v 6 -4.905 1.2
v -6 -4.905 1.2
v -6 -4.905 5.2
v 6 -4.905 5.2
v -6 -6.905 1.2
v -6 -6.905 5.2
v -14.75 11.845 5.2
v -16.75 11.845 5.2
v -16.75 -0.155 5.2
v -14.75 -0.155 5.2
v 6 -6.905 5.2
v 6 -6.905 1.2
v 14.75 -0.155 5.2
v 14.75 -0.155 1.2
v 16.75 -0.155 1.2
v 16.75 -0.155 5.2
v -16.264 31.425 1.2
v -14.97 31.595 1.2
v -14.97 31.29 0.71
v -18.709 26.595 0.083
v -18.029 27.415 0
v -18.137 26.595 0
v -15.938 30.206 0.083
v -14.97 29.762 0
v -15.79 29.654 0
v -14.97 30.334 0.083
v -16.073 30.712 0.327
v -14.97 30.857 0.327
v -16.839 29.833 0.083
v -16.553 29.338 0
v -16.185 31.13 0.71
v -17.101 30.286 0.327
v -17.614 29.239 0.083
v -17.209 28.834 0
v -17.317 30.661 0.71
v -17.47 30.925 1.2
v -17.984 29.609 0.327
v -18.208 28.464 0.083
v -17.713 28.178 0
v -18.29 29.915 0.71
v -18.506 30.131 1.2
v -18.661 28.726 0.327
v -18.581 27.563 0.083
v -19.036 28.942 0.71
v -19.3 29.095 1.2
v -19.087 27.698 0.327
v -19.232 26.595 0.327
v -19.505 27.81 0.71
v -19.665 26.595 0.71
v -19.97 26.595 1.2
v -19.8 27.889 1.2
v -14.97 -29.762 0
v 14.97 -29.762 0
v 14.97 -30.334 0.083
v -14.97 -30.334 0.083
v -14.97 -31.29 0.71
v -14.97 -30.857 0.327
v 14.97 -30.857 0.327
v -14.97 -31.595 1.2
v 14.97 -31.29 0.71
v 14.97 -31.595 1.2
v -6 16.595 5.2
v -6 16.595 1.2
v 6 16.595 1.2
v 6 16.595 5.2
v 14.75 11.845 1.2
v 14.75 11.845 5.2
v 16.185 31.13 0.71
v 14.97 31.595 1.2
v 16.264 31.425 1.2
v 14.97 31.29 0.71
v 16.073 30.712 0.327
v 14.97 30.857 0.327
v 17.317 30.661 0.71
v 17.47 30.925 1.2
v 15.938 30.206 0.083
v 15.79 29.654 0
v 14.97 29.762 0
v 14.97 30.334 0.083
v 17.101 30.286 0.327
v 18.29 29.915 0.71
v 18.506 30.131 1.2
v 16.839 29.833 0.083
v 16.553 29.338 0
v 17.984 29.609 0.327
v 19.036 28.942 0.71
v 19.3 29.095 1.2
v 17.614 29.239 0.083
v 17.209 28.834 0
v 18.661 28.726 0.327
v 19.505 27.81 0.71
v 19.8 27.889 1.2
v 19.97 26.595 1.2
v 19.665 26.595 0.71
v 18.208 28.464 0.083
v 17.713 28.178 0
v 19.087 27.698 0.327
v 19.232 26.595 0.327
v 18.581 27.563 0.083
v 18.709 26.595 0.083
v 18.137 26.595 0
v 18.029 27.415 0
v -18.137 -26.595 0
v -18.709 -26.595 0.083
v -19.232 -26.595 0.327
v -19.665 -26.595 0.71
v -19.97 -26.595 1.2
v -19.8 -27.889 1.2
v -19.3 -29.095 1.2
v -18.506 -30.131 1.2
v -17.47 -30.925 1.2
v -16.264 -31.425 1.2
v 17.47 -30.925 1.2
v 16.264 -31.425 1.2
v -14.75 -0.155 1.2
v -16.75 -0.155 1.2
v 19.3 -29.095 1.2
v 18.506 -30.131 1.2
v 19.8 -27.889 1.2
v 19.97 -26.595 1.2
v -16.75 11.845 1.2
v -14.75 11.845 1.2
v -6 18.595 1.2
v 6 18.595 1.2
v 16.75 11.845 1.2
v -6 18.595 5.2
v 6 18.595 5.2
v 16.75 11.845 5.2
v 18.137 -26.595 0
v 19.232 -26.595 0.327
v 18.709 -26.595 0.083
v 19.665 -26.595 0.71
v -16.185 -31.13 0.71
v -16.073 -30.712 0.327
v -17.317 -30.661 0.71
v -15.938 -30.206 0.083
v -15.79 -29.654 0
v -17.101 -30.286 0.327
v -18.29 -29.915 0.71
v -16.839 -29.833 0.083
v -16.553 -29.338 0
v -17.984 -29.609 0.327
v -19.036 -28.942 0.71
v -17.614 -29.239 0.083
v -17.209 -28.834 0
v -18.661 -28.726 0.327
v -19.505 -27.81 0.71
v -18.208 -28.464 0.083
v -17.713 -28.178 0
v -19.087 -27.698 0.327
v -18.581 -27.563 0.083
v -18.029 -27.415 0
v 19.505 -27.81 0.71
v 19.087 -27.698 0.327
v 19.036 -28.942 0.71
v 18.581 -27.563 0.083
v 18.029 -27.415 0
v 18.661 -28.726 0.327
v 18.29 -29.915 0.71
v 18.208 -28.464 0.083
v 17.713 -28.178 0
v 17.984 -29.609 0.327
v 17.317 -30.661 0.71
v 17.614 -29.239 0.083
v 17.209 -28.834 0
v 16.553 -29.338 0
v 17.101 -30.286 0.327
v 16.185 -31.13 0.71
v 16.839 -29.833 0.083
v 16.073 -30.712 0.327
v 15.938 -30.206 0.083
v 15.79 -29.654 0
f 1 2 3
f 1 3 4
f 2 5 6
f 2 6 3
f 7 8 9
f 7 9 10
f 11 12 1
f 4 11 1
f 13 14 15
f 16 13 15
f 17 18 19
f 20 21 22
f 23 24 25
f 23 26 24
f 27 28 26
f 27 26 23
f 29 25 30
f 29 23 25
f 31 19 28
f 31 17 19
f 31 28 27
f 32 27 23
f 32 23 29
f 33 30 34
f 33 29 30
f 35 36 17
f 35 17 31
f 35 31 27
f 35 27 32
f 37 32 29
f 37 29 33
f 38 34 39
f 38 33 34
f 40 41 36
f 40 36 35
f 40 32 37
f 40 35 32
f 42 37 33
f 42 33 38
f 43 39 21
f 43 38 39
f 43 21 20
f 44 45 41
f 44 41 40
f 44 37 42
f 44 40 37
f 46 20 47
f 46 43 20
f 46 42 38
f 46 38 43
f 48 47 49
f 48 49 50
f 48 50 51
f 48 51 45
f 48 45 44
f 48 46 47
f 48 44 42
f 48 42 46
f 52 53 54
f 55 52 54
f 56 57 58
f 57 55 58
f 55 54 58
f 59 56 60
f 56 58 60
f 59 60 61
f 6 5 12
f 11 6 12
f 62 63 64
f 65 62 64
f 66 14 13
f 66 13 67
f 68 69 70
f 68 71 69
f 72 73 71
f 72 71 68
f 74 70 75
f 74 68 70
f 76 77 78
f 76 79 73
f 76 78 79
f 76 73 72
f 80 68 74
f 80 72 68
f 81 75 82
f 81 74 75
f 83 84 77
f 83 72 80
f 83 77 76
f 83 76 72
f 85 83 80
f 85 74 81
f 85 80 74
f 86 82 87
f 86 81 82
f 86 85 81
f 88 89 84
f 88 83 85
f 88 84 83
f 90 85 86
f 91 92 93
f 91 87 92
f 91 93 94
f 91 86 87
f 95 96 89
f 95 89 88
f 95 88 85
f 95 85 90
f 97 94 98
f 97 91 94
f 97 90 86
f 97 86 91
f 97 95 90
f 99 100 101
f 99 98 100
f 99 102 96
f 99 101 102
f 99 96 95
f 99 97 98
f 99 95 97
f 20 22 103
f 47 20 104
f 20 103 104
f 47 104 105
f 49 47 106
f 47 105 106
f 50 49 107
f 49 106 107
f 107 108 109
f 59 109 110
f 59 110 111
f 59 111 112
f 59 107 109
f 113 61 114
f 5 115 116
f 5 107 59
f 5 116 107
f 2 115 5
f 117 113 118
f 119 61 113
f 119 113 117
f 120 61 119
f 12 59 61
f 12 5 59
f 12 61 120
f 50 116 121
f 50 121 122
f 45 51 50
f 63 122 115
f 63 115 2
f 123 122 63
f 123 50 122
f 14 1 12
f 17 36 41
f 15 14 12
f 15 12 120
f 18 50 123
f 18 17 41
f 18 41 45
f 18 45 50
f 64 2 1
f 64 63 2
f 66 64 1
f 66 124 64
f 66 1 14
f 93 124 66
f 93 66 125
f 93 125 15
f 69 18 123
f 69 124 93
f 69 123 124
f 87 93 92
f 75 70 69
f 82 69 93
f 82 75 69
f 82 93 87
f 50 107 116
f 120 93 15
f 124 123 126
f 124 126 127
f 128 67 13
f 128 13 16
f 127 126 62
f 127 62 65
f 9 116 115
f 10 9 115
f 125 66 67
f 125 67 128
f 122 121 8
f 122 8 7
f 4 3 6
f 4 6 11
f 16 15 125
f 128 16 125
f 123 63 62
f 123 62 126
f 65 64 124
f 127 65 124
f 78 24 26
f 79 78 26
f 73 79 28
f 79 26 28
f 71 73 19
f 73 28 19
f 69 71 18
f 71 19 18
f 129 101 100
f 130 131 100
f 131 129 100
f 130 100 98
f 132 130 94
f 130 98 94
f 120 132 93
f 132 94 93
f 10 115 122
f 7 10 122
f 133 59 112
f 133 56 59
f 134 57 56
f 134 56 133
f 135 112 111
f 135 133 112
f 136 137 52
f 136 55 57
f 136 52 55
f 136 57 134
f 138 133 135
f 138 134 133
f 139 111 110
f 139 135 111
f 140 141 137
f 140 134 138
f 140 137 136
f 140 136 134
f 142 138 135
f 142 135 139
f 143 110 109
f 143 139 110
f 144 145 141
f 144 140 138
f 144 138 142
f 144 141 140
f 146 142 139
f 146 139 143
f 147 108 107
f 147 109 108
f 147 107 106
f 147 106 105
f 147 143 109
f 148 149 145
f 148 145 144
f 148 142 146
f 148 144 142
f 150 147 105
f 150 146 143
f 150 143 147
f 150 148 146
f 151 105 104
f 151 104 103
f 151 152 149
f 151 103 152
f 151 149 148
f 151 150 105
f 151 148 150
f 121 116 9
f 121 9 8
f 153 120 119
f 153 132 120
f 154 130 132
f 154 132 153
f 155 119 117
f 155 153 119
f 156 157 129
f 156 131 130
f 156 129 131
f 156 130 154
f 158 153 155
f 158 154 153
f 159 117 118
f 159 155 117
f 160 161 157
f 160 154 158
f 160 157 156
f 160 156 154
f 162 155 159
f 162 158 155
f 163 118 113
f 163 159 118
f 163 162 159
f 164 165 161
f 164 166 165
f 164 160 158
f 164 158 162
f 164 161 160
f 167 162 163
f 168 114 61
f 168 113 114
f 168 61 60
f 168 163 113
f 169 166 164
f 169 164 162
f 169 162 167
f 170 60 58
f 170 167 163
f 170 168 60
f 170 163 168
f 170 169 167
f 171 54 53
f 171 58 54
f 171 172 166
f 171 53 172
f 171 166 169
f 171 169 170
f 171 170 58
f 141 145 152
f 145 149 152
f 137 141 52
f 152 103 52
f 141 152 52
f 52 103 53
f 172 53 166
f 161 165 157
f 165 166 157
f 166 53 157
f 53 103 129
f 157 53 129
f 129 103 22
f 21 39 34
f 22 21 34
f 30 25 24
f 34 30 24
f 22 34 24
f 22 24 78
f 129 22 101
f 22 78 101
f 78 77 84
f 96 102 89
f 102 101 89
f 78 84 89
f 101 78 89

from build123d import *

# Parameters (mm, degrees)
SKETCH_1_W      = 39.94
SKETCH_1_H      = 63.19
EXTRUDE_1_DEPTH = 1.2
FILLET_1_R      = 5
FILLET_3_R      = 2
SKETCH_5_W      = 2
SKETCH_5_H      = 12
SKETCH_5_W_2    = 12
SKETCH_5_H_2    = 2
EXTRUDE_4_DEPTH = 4


with BuildPart() as part:
    # 草图1 → 凸台-拉伸1 (new body)
    with BuildSketch(Plane.XY):
        Rectangle(SKETCH_1_W, SKETCH_1_H)
    extrude(amount=EXTRUDE_1_DEPTH)

    # 圆角1
    fillet_1_edges = [part.edges().sort_by_distance(p)[0] for p in [
        (19.97, -31.595, 0.6),
        (-19.97, -31.595, 0.6),
        (-19.97, 31.595, 0.6),
        (19.97, 31.595, 0.6),
    ]]
    fillet(fillet_1_edges, radius=FILLET_1_R)

    # 圆角3
    # the kernel refuses this fillet: 2 mm, written as the material it takes off along each edge
    with BuildSketch(Plane(origin=(-14.97, -26.595, 0), x_dir=(0, -1, 0), z_dir=(1, 0, 0))) as fillet_3_piece_1:
        with BuildLine():
            CenterArc((3.166969722, -2), FILLET_3_R, 23.578178478, 66.421821522)
            Line((5, -1.2), (5.036660606, -1.184))
            ThreePointArc((5.036660606, -1.184), (5.04, -0.6), (5.04, 0))
            Line((5.04, 0), (5, 0.04))
            Line((5, 0.04), (3.166969722, 0.04))
            Line((3.166969722, 0.04), (3.166969722, 0))
        make_face()
    revolve(axis=Axis((-14.97, -26.595, 0), (0, 0, -1)), revolution_arc=90, mode=Mode.SUBTRACT)
    with BuildSketch(Plane(origin=(14.97, -31.595, 0), x_dir=(0, 1, 0), z_dir=(-1, 0, 0))) as fillet_3_piece_2:
        with BuildLine():
            CenterArc((1.833030278, -2), FILLET_3_R, 90, 66.421821522)
            Line((0, -1.2), (-0.036660606, -1.184))
            ThreePointArc((-0.036660606, -1.184), (-0.04, -0.6), (-0.04, 0))
            Line((-0.04, 0), (0, 0.04))
            Line((0, 0.04), (1.833030278, 0.04))
            Line((1.833030278, 0.04), (1.833030278, 0))
        make_face()
    extrude(amount=29.94, mode=Mode.SUBTRACT)
    with BuildSketch(Plane(origin=(14.97, -26.595, 0), x_dir=(1, 0, 0), z_dir=(0, 1, 0))) as fillet_3_piece_3:
        with BuildLine():
            CenterArc((3.166969722, -2), FILLET_3_R, 23.578178478, 66.421821522)
            Line((5, -1.2), (5.036660606, -1.184))
            ThreePointArc((5.036660606, -1.184), (5.04, -0.6), (5.04, 0))
            Line((5.04, 0), (5, 0.04))
            Line((5, 0.04), (3.166969722, 0.04))
            Line((3.166969722, 0.04), (3.166969722, 0))
        make_face()
    revolve(axis=Axis((14.97, -26.595, 0), (0, 0, -1)), revolution_arc=90, mode=Mode.SUBTRACT)
    with BuildSketch(Plane(origin=(19.97, 26.595, 0), x_dir=(-1, 0, 0), z_dir=(0, -1, 0)), Plane(origin=(-19.97, -26.595, 0), x_dir=(1, 0, 0), z_dir=(0, 1, 0))) as fillet_3_piece_4:
        with BuildLine():
            CenterArc((1.833030278, -2), FILLET_3_R, 90, 66.421821522)
            Line((0, -1.2), (-0.036660606, -1.184))
            ThreePointArc((-0.036660606, -1.184), (-0.04, -0.6), (-0.04, 0))
            Line((-0.04, 0), (0, 0.04))
            Line((0, 0.04), (1.833030278, 0.04))
            Line((1.833030278, 0.04), (1.833030278, 0))
        make_face()
    extrude(amount=53.19, mode=Mode.SUBTRACT)
    with BuildSketch(Plane(origin=(14.97, 26.595, 0), x_dir=(0, 1, 0), z_dir=(-1, 0, 0))) as fillet_3_piece_5:
        with BuildLine():
            CenterArc((3.166969722, -2), FILLET_3_R, 23.578178478, 66.421821522)
            Line((5, -1.2), (5.036660606, -1.184))
            ThreePointArc((5.036660606, -1.184), (5.04, -0.6), (5.04, 0))
            Line((5.04, 0), (5, 0.04))
            Line((5, 0.04), (3.166969722, 0.04))
            Line((3.166969722, 0.04), (3.166969722, 0))
        make_face()
    revolve(axis=Axis((14.97, 26.595, 0), (0, 0, -1)), revolution_arc=90, mode=Mode.SUBTRACT)
    with BuildSketch(Plane(origin=(-14.97, 31.595, 0), x_dir=(0, 0, 1), z_dir=(1, 0, 0))) as fillet_3_piece_6:
        with BuildLine():
            CenterArc((2, 1.833030278), FILLET_3_R, 180, 66.421821522)
            Line((0, 1.833030278), (-0.04, 1.833030278))
            Line((-0.04, 1.833030278), (-0.04, 0))
            Line((-0.04, 0), (0, -0.04))
            ThreePointArc((0, -0.04), (0.6, -0.04), (1.184, -0.036660606))
            Line((1.184, -0.036660606), (1.2, 0))
        make_face()
    extrude(amount=29.94, mode=Mode.SUBTRACT)
    with BuildSketch(Plane(origin=(-14.97, 26.595, 0), x_dir=(0, 1, 0), z_dir=(1, 0, 0))) as fillet_3_piece_7:
        with BuildLine():
            CenterArc((3.166969722, 2), FILLET_3_R, 270, 66.421821522)
            Line((5, 1.2), (5.036660606, 1.184))
            ThreePointArc((5.036660606, 1.184), (5.04, 0.6), (5.04, 0))
            Line((5.04, 0), (5, -0.04))
            Line((5, -0.04), (3.166969722, -0.04))
            Line((3.166969722, -0.04), (3.166969722, 0))
        make_face()
    revolve(axis=Axis((-14.97, 26.595, 0), (0, 0, 1)), revolution_arc=90, mode=Mode.SUBTRACT)

    # 草图5 → 凸台-拉伸4 (add)
    with BuildSketch(Plane.XY.offset(1.2)):
        with Locations((-15.75, 5.845)):
            Rectangle(SKETCH_5_W, SKETCH_5_H)
        with Locations((0, 17.595)):
            Rectangle(SKETCH_5_W_2, SKETCH_5_H_2)
        with Locations((0, -5.905)):
            Rectangle(SKETCH_5_W_2, SKETCH_5_H_2)
        with Locations((15.75, 5.845)):
            Rectangle(SKETCH_5_W, SKETCH_5_H)
    extrude(amount=EXTRUDE_4_DEPTH)


solid = part.part
